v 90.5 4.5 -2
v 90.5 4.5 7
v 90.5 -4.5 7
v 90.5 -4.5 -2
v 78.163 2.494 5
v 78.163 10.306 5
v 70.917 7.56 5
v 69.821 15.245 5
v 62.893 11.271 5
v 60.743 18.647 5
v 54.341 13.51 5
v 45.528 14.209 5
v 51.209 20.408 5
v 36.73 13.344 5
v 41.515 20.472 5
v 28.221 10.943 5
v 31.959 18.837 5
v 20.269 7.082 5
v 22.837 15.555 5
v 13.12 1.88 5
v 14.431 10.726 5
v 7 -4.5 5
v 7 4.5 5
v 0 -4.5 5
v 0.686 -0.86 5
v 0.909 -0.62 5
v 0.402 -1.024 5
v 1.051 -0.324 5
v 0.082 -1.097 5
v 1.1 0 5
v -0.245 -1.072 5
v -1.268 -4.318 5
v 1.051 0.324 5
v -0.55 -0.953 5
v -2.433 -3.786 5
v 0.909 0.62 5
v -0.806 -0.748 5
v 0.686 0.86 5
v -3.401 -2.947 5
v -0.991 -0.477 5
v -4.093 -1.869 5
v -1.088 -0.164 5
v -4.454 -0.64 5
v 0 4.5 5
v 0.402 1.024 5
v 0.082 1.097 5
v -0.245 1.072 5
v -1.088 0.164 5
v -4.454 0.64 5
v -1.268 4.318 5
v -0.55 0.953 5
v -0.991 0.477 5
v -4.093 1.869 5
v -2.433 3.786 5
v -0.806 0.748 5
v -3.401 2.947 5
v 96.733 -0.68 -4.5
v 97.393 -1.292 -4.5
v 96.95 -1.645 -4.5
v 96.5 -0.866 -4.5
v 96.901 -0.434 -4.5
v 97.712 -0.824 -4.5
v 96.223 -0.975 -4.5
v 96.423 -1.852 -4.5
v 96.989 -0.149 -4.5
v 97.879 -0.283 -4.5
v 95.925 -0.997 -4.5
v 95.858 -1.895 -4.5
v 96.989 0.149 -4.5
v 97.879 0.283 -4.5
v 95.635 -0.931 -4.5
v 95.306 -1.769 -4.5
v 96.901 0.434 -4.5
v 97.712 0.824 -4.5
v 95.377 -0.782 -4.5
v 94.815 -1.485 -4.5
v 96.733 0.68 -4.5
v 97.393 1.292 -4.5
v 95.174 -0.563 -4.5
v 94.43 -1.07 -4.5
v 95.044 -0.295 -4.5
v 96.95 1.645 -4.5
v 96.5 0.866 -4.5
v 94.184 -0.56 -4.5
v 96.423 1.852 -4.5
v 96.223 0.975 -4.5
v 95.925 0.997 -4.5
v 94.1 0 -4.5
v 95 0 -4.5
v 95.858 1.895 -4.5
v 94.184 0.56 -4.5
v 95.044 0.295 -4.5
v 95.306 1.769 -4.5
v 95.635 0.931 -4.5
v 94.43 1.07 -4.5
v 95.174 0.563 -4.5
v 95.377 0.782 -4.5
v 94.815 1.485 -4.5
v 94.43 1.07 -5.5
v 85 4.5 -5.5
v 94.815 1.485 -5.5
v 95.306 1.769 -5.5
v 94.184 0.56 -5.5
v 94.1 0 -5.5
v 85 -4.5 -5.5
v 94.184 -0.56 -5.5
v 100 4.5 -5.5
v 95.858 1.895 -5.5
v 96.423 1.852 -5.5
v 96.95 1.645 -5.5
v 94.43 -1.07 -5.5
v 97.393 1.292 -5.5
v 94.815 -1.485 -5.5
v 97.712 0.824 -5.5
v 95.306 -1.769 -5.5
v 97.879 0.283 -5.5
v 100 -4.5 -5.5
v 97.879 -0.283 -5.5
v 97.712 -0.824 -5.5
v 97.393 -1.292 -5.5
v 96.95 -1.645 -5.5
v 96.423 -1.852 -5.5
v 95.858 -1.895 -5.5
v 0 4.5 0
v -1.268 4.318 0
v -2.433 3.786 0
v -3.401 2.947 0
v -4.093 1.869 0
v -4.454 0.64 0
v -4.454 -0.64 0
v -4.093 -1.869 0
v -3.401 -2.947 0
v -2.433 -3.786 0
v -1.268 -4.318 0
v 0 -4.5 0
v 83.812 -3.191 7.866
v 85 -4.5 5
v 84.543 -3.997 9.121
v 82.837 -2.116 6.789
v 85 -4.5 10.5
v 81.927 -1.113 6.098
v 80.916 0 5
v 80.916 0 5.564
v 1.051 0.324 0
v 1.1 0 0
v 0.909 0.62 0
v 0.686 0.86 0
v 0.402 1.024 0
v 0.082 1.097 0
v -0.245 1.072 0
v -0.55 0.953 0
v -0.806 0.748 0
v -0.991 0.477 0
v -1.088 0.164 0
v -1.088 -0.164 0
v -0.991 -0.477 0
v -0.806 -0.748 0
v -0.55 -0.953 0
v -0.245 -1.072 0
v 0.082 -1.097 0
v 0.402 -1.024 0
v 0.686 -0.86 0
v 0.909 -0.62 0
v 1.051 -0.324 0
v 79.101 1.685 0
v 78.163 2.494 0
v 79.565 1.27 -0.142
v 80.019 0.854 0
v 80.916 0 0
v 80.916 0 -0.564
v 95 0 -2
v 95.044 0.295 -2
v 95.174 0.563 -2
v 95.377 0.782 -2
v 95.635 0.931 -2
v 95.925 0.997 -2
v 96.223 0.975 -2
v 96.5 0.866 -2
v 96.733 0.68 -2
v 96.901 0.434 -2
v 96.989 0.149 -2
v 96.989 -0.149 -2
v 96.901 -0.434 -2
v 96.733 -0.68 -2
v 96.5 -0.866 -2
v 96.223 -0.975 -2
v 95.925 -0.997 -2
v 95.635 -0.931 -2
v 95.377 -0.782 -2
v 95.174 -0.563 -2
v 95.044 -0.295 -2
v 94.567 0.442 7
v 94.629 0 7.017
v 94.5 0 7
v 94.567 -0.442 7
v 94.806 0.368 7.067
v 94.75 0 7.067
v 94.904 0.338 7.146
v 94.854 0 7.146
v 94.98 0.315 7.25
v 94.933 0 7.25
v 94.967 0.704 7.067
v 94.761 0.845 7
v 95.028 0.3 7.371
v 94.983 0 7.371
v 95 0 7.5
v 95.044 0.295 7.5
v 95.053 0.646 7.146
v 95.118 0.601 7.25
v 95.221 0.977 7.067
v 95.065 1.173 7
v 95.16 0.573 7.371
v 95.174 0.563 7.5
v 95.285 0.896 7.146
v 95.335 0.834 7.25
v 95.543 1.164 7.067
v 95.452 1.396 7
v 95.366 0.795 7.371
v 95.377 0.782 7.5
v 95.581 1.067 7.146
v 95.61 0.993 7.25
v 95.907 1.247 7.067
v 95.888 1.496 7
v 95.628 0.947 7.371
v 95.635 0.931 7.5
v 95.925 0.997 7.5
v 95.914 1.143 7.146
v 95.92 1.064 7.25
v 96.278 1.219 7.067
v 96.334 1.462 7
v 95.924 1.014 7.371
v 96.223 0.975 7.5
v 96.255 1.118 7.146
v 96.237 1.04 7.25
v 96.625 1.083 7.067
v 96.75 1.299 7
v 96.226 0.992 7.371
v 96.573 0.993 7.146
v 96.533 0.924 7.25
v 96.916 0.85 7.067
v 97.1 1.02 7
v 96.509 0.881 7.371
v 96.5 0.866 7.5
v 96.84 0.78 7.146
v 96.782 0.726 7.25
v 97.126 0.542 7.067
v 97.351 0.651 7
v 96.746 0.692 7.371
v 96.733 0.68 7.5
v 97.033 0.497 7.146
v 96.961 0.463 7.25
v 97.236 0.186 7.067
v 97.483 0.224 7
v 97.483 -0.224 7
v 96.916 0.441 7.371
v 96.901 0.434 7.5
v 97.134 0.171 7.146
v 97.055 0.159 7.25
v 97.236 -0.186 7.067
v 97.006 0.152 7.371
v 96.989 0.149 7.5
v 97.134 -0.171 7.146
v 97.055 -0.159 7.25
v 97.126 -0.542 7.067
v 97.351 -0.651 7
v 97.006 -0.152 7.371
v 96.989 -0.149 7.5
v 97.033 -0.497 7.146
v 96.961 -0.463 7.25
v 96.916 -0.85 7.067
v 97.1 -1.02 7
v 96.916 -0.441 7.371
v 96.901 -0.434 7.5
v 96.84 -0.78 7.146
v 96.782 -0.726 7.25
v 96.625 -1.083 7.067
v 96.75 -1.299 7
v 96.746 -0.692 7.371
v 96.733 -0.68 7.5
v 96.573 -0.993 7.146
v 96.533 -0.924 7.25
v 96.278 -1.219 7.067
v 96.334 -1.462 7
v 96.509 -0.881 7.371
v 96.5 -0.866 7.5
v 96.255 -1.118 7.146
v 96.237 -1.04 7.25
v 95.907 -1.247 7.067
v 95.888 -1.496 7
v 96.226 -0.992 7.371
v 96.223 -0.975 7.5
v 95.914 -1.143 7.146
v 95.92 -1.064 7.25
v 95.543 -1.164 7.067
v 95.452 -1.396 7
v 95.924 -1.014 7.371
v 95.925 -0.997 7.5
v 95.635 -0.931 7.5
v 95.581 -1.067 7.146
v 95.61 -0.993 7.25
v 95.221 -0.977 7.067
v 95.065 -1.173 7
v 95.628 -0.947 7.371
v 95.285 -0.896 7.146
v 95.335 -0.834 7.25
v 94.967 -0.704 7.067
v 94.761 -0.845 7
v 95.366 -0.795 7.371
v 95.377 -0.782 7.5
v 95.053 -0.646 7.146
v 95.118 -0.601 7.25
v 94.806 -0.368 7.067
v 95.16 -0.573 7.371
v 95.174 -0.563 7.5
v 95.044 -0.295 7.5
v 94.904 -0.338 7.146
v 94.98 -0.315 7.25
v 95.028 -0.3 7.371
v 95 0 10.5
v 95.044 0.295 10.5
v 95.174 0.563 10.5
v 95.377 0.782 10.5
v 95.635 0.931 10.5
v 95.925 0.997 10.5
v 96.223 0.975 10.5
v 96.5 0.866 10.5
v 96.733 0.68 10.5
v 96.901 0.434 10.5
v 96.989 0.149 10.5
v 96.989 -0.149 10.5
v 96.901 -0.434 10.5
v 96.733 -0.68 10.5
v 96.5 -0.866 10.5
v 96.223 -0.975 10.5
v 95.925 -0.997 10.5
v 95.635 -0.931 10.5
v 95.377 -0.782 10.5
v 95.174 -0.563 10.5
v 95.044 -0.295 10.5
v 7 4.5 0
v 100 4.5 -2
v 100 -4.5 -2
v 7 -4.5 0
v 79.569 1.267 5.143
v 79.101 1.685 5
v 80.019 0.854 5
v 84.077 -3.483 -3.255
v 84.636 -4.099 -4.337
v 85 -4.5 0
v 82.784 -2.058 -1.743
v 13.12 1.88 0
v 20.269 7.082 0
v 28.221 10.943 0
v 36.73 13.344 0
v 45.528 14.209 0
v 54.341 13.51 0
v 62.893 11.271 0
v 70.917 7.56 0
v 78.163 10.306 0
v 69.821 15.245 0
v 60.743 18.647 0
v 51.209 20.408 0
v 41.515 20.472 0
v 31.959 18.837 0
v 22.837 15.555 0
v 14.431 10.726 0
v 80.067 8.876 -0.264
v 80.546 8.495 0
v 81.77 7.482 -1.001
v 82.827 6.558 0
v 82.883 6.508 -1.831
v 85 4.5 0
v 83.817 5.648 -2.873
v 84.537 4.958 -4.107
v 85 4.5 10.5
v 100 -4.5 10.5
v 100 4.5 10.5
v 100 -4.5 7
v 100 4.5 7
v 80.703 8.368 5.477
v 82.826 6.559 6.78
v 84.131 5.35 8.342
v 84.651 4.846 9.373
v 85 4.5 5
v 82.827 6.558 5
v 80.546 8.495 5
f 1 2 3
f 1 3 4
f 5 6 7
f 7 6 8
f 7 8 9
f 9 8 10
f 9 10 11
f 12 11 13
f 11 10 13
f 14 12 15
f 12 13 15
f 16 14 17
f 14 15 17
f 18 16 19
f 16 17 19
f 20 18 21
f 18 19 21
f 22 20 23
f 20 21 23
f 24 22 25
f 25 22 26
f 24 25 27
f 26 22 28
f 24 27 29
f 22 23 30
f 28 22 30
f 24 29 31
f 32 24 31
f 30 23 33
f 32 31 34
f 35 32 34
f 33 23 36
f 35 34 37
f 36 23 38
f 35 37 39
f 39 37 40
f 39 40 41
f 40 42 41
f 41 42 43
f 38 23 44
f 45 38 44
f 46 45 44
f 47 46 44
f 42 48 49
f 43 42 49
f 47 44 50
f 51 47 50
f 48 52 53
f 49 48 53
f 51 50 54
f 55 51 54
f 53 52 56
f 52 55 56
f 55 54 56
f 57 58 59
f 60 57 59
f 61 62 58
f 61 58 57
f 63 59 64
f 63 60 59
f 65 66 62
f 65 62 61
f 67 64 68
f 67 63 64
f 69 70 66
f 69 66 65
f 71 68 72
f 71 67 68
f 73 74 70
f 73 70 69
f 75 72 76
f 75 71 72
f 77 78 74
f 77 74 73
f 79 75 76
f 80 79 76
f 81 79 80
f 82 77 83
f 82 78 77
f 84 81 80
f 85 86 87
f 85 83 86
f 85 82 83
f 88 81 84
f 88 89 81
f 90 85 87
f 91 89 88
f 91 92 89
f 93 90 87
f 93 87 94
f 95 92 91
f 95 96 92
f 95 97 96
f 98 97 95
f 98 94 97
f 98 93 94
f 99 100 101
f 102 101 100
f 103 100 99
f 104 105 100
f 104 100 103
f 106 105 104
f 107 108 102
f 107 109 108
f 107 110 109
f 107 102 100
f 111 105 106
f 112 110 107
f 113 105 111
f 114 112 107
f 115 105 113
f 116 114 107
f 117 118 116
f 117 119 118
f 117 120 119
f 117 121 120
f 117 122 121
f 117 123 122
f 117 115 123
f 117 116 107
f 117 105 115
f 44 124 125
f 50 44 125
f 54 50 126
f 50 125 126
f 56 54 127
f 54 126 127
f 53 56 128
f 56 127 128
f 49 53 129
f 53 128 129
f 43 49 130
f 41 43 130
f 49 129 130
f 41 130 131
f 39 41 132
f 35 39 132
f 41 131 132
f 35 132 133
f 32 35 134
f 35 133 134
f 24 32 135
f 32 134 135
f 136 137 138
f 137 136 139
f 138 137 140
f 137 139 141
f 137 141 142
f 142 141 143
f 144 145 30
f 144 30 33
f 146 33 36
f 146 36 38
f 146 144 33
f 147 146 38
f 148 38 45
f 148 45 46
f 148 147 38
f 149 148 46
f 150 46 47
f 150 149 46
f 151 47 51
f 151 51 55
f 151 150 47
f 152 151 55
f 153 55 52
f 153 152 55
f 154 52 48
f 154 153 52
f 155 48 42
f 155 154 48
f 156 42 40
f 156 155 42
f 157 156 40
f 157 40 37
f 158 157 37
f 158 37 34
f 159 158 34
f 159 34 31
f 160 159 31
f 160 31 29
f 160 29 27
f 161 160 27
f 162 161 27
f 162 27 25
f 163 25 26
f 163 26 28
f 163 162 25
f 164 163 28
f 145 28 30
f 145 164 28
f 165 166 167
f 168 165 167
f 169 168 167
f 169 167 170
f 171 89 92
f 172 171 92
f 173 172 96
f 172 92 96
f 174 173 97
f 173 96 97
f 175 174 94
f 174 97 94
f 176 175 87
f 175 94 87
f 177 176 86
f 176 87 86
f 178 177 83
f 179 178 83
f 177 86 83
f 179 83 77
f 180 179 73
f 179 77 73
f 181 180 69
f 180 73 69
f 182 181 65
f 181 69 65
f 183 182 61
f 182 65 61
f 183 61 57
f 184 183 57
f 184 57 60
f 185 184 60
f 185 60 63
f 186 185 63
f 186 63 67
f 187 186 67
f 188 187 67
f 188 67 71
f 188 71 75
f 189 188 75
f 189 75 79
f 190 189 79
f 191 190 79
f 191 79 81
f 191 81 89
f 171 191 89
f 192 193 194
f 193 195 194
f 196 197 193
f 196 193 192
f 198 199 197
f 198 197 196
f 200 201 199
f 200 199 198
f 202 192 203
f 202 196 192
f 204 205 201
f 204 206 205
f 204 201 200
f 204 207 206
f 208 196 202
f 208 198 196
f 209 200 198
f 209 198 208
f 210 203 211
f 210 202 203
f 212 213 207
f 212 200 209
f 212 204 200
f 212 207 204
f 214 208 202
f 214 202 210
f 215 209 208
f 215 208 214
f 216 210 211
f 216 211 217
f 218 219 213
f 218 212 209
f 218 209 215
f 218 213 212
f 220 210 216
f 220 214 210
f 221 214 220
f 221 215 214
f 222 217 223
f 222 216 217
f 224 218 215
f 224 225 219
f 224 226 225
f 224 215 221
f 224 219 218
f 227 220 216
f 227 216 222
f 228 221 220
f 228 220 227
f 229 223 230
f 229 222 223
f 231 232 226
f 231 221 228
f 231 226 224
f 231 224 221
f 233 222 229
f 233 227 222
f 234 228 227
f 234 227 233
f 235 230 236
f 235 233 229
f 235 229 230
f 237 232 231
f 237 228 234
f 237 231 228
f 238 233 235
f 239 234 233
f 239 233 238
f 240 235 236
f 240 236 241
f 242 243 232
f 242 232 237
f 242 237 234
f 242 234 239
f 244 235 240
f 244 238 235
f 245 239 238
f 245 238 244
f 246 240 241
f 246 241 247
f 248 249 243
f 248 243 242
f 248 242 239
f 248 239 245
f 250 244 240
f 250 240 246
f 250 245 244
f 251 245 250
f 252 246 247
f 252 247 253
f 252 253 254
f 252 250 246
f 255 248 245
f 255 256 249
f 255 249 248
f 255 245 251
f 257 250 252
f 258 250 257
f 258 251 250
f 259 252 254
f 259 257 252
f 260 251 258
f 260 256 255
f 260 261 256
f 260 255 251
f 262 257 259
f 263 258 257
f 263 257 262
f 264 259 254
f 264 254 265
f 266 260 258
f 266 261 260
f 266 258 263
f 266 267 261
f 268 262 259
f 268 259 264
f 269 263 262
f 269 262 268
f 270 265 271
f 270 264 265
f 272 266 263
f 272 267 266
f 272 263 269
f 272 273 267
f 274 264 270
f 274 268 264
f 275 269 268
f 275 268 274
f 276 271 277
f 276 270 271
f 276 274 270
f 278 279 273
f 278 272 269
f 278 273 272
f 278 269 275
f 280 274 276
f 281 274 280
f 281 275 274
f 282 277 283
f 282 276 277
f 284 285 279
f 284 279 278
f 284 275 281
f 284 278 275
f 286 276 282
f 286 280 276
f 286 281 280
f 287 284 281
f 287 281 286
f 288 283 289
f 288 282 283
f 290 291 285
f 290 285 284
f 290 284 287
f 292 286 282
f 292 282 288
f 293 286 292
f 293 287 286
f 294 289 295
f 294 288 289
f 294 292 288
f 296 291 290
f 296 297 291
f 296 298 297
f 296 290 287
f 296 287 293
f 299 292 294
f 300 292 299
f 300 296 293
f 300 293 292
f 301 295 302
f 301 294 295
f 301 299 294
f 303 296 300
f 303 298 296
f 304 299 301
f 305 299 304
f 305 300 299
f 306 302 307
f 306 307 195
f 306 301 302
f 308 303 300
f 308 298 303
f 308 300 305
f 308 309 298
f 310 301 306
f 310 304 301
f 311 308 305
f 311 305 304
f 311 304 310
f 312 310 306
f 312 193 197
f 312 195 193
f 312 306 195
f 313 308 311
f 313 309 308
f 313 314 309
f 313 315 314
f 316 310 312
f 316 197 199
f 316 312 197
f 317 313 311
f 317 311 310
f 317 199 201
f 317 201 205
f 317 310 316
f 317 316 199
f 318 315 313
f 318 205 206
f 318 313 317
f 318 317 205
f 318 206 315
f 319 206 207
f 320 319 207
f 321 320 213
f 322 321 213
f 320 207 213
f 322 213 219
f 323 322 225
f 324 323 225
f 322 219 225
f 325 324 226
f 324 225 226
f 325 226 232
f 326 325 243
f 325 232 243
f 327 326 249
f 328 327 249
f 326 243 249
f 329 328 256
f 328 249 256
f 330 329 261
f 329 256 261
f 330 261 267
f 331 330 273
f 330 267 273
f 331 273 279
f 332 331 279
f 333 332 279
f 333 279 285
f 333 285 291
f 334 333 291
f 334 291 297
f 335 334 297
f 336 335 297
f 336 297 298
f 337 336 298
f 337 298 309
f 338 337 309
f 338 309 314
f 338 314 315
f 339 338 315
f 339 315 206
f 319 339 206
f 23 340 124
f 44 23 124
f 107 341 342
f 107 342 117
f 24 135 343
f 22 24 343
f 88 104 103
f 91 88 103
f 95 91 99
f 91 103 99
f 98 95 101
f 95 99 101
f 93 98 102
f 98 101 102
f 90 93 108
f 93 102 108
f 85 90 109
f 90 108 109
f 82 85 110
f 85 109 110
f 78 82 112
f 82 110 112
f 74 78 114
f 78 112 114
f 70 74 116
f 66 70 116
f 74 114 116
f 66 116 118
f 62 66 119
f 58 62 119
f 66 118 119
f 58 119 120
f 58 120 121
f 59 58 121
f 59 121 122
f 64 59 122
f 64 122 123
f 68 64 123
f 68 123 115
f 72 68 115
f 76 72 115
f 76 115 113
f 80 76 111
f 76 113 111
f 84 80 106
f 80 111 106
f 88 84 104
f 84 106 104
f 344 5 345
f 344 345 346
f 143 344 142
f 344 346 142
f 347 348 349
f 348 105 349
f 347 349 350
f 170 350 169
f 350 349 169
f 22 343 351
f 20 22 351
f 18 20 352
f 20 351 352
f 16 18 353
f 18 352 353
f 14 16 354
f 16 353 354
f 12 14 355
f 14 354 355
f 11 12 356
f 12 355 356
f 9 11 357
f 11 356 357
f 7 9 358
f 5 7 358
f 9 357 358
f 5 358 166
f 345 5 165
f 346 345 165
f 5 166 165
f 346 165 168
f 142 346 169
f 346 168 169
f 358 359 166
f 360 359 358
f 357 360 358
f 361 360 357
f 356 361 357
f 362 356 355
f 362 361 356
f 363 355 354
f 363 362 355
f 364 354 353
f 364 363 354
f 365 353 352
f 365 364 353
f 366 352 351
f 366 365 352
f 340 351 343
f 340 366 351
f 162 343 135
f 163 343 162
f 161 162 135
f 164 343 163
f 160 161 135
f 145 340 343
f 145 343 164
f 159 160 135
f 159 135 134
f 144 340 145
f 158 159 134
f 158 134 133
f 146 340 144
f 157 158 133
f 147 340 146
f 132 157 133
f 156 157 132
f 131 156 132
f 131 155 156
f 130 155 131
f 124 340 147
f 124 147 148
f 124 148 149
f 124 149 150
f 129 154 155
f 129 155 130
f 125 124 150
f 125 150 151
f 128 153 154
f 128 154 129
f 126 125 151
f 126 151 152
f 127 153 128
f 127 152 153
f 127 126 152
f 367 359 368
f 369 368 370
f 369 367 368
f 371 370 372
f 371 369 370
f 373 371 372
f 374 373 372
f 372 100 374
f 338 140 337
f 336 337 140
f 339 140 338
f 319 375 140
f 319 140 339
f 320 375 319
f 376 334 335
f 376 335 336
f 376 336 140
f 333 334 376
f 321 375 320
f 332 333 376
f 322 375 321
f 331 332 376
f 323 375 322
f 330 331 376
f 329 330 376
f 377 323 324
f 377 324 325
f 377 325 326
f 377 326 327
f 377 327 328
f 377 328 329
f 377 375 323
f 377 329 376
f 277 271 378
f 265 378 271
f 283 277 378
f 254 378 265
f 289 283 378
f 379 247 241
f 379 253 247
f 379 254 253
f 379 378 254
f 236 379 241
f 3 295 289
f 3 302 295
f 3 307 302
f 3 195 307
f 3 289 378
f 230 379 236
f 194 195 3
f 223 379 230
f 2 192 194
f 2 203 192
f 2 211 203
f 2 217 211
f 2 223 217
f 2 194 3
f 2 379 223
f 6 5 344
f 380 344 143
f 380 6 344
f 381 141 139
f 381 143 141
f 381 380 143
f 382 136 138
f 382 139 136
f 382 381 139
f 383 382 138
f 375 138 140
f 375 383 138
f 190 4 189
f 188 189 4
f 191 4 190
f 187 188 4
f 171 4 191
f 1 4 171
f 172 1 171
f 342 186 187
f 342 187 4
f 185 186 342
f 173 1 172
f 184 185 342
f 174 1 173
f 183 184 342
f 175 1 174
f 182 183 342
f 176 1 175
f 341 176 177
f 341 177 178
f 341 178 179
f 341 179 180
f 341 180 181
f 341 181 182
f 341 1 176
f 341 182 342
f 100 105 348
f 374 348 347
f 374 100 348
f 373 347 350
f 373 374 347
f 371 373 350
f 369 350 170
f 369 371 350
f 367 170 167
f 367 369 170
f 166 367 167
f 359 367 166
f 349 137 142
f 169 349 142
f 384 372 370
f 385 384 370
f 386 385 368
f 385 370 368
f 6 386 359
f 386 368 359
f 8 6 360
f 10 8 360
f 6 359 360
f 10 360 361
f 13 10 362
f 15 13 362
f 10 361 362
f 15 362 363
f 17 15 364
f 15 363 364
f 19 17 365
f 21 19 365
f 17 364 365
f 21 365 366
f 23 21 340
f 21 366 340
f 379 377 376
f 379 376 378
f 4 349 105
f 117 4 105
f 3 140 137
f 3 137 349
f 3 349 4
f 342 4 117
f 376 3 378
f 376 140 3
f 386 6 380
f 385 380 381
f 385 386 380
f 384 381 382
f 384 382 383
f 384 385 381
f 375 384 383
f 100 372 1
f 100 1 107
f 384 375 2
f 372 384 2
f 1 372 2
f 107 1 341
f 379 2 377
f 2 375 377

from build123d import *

# Parameters (mm, degrees)
SKETCH1_R           = 1.1
BOSS_EXTRUDE1_DEPTH = 5
BOSS_EXTRUDE2_DEPTH = 5
BOSS_EXTRUDE3_DEPTH = 9
SKETCH5_R           = 1
CUT_EXTRUDE1_DEPTH  = 16
SKETCH6_R           = 1.9
CUT_EXTRUDE2_DEPTH  = 1
FILLET1_R           = 0.5
SKETCH7_W           = 5
SKETCH7_H           = 16
BOSS_EXTRUDE4_DEPTH = 9
FILLET2_R           = 7


with BuildPart() as part:
    # Sketch1 → Boss-Extrude1 (new body)
    with BuildSketch(Plane.XY):
        with BuildLine():
            ThreePointArc((0, 4.5), (-4.5, 0), (0, -4.5))
            Line((0, -4.5), (7, -4.5))
            ThreePointArc((7, -4.5), (42.961642557, 14.118622766), (80.916317371, 0))
            Line((80.916317371, 0), (90, 0))
            Line((90, 0), (90, 4.5))
            Line((90, 4.5), (85, 4.5))
            ThreePointArc((85, 4.5), (46, 20.654328933), (7, 4.5))
            Line((7, 4.5), (0, 4.5))
        make_face()
        Circle(SKETCH1_R, mode=Mode.SUBTRACT)
    extrude(amount=BOSS_EXTRUDE1_DEPTH)

    # Sketch3 → Boss-Extrude2 (add)
    with BuildSketch(Plane.XY.offset(5)):
        Polygon((90, 0), (90, -4.5), (85, -4.5), (80.916317371, 0), align=None)
    extrude(amount=-BOSS_EXTRUDE2_DEPTH)

    # Sketch4 → Boss-Extrude3 (add)
    with BuildSketch(Plane(origin=(0, 4.5, 0), x_dir=(1, 0, 0), z_dir=(0, 1, 0))):
        Polygon((90.5, 2), (100, 2), (100, 5.5), (90, 5.5), (90, 0), (90, -5), (90, -10.5), (100, -10.5), (100, -7), (90.5, -7), align=None)
    extrude(amount=-BOSS_EXTRUDE3_DEPTH)

    # Sketch5 → Cut-Extrude1 (cut)
    with BuildSketch(Plane(origin=(0, 0, -5.5), x_dir=(-1, 0, 0), z_dir=(0, 0, -1))):
        with Locations((-96, 0)):
            Circle(SKETCH5_R)
    extrude(amount=-CUT_EXTRUDE1_DEPTH, mode=Mode.SUBTRACT)

    # Sketch6 → Cut-Extrude2 (cut)
    with BuildSketch(Plane(origin=(0, 0, -5.5), x_dir=(-1, 0, 0), z_dir=(0, 0, -1))):
        with Locations((-96, 0)):
            Circle(SKETCH6_R)
    extrude(amount=-CUT_EXTRUDE2_DEPTH, mode=Mode.SUBTRACT)

    # Fillet1
    fillet1_edges = [part.edges().sort_by_distance(p)[0] for p in [
        (97, 0, 7),
    ]]
    fillet(fillet1_edges, radius=FILLET1_R)

    # Sketch7 → Boss-Extrude4 (add)
    with BuildSketch(Plane.XZ.offset(4.5)):
        with Locations((87.5, 2.5)):
            Rectangle(SKETCH7_W, SKETCH7_H)
    extrude(amount=-BOSS_EXTRUDE4_DEPTH)

    # Fillet2
    # the kernel refuses this fillet: 7 mm, written as the material it adds along each edge
    with BuildSketch(Plane(origin=(85, 21.593492914, 0), x_dir=(0, 0, -1), z_dir=(0, -1, 0))) as fillet2_piece_1_section:
        with BuildLine():
            CenterArc((7, -6.837397166), FILLET2_R, 102.373625116, 77.626374884)
            Line((0, -6.837397166), (0, 0))
            Line((0, 0), (5.5, 0))
        make_face()
    fillet2_piece_1 = extrude(amount=43.186985828, mode=Mode.PRIVATE)
    fillet2_piece_1 = fillet2_piece_1 & Plane(origin=(46, -34.5, 0), x_dir=(0.7071067811865476, 0.7071067811865476, 0), z_dir=(0, 0, -1)) * Cylinder(55.154328933, 114, mode=Mode.PRIVATE)
    fillet2_piece_1 = split(fillet2_piece_1, bisect_by=Plane(origin=(72.014490495, 9.809337449, 0), z_dir=(0.7405316990978602, 0.6720214301874877, 0)), keep=Keep.TOP, mode=Mode.PRIVATE)
    add(fillet2_piece_1)
    with BuildSketch(Plane(origin=(85, 4.5, 0), x_dir=(0, 0, -1), z_dir=(0, -1, 0))) as fillet2_piece_2_section:
        with BuildLine():
            CenterArc((7, -6.837397166), FILLET2_R, 102.373625116, 77.626374884)
            Line((0, -6.837397166), (0, 0))
            Line((0, 0), (5.5, 0))
        make_face()
    fillet2_piece_2 = extrude(amount=26.093492914, mode=Mode.PRIVATE)
    fillet2_piece_2 = fillet2_piece_2 - Plane(origin=(46, -35.788975694, 0), x_dir=(-0.7799999999999994, 0.6257795138864816, 0), z_dir=(0, 0, -1)) * Cylinder(50, 80, mode=Mode.PRIVATE)
    add(fillet2_piece_2)
    with BuildSketch(Plane(origin=(85, 21.593492914, 5), x_dir=(-1, 0, 0), z_dir=(0, -1, 0))) as fillet2_piece_3_section:
        with BuildLine():
            CenterArc((6.837397166, -7), FILLET2_R, 90, 77.626374884)
            Line((0, -5.5), (0, 0))
            Line((0, 0), (6.837397166, 0))
        make_face()
    fillet2_piece_3 = extrude(amount=43.186985828, mode=Mode.PRIVATE)
    fillet2_piece_3 = fillet2_piece_3 & Plane(origin=(46, -34.5, 5), x_dir=(0.7071067811865476, 0.7071067811865476, 0), z_dir=(0, 0, -1)) * Cylinder(55.154328933, 114, mode=Mode.PRIVATE)
    fillet2_piece_3 = split(fillet2_piece_3, bisect_by=Plane(origin=(72.014490495, 9.809337449, 5), z_dir=(0.7405316990978602, 0.6720214301874877, 0)), keep=Keep.TOP, mode=Mode.PRIVATE)
    add(fillet2_piece_3)
    with BuildSketch(Plane(origin=(85, 4.5, 5), x_dir=(-1, 0, 0), z_dir=(0, -1, 0))) as fillet2_piece_4_section:
        with BuildLine():
            CenterArc((6.837397166, -7), FILLET2_R, 90, 77.626374884)
            Line((0, -5.5), (0, 0))
            Line((0, 0), (6.837397166, 0))
        make_face()
    fillet2_piece_4 = extrude(amount=26.093492914, mode=Mode.PRIVATE)
    fillet2_piece_4 = fillet2_piece_4 - Plane(origin=(46, -35.788975694, 5), x_dir=(-0.7799999999999994, 0.6257795138864816, 0), z_dir=(0, 0, -1)) * Cylinder(50, 80, mode=Mode.PRIVATE)
    add(fillet2_piece_4)


solid = part.part
